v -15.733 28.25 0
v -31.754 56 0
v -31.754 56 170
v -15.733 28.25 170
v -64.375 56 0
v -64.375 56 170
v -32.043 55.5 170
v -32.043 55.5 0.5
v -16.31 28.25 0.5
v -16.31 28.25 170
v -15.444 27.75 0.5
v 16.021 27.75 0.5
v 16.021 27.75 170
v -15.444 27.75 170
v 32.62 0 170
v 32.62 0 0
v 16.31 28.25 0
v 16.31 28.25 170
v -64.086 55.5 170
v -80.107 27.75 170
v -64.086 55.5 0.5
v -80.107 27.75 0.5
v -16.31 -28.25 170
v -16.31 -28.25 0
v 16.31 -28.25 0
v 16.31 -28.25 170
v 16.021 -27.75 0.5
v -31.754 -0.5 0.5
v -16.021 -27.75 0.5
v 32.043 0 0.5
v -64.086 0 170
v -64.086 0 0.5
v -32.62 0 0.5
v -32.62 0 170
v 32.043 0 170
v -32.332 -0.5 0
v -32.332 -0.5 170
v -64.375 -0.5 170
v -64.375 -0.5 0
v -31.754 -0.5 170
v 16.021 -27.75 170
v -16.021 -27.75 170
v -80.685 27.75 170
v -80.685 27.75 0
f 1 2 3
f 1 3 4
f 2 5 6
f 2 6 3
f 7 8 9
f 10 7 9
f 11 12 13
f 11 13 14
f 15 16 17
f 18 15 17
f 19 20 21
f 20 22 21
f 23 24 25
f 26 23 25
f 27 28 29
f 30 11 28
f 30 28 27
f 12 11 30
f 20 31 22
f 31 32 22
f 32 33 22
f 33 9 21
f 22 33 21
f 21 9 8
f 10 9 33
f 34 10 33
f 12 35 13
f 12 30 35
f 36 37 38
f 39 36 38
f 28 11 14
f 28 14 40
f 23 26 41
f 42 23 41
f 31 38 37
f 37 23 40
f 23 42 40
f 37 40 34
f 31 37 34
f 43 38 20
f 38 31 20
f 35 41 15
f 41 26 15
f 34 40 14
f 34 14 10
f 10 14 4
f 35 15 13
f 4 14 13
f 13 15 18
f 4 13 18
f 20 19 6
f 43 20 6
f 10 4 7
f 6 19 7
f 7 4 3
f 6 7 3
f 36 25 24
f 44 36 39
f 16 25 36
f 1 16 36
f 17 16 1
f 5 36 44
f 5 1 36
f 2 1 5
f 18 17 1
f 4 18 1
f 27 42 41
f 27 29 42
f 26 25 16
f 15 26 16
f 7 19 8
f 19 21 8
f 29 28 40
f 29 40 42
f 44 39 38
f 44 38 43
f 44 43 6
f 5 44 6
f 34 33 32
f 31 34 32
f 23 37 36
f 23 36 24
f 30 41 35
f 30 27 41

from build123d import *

# Parameters (mm, degrees)
F1_DEPTH = 170
F2_T     = -0.5


# Not quite as in the source:
# - a feature names something its author has since deleted; it is built from what else it names


with BuildPart() as f1:
    # F0 (on Top) → F1 (new body)
    with BuildSketch(Plane.XY):
        Polygon((16.3101451046, 28.25), (-16.3101451046, 28.25), (-32.6202902092, 0), (-16.3101451046, -28.25), (16.3101451046, -28.25), (32.6202902092, 0), align=None)
    extrude(amount=F1_DEPTH)

    # F2
    f2_openings = [f1.faces().sort_by_distance(p)[0] for p in [
        (0, 0, 170),
    ]]
    offset(amount=F2_T, openings=f2_openings)

    # F3: F1 across face


with BuildPart() as f1_1:
    add(f1.part)
    add(f1.part.mirror(Plane(origin=(-24.032204955, 13.875, 85.25), x_dir=(0.5, 0.8660254038, 0), z_dir=(0.8660254038, -0.5, 0))))


solid = f1_1.part
